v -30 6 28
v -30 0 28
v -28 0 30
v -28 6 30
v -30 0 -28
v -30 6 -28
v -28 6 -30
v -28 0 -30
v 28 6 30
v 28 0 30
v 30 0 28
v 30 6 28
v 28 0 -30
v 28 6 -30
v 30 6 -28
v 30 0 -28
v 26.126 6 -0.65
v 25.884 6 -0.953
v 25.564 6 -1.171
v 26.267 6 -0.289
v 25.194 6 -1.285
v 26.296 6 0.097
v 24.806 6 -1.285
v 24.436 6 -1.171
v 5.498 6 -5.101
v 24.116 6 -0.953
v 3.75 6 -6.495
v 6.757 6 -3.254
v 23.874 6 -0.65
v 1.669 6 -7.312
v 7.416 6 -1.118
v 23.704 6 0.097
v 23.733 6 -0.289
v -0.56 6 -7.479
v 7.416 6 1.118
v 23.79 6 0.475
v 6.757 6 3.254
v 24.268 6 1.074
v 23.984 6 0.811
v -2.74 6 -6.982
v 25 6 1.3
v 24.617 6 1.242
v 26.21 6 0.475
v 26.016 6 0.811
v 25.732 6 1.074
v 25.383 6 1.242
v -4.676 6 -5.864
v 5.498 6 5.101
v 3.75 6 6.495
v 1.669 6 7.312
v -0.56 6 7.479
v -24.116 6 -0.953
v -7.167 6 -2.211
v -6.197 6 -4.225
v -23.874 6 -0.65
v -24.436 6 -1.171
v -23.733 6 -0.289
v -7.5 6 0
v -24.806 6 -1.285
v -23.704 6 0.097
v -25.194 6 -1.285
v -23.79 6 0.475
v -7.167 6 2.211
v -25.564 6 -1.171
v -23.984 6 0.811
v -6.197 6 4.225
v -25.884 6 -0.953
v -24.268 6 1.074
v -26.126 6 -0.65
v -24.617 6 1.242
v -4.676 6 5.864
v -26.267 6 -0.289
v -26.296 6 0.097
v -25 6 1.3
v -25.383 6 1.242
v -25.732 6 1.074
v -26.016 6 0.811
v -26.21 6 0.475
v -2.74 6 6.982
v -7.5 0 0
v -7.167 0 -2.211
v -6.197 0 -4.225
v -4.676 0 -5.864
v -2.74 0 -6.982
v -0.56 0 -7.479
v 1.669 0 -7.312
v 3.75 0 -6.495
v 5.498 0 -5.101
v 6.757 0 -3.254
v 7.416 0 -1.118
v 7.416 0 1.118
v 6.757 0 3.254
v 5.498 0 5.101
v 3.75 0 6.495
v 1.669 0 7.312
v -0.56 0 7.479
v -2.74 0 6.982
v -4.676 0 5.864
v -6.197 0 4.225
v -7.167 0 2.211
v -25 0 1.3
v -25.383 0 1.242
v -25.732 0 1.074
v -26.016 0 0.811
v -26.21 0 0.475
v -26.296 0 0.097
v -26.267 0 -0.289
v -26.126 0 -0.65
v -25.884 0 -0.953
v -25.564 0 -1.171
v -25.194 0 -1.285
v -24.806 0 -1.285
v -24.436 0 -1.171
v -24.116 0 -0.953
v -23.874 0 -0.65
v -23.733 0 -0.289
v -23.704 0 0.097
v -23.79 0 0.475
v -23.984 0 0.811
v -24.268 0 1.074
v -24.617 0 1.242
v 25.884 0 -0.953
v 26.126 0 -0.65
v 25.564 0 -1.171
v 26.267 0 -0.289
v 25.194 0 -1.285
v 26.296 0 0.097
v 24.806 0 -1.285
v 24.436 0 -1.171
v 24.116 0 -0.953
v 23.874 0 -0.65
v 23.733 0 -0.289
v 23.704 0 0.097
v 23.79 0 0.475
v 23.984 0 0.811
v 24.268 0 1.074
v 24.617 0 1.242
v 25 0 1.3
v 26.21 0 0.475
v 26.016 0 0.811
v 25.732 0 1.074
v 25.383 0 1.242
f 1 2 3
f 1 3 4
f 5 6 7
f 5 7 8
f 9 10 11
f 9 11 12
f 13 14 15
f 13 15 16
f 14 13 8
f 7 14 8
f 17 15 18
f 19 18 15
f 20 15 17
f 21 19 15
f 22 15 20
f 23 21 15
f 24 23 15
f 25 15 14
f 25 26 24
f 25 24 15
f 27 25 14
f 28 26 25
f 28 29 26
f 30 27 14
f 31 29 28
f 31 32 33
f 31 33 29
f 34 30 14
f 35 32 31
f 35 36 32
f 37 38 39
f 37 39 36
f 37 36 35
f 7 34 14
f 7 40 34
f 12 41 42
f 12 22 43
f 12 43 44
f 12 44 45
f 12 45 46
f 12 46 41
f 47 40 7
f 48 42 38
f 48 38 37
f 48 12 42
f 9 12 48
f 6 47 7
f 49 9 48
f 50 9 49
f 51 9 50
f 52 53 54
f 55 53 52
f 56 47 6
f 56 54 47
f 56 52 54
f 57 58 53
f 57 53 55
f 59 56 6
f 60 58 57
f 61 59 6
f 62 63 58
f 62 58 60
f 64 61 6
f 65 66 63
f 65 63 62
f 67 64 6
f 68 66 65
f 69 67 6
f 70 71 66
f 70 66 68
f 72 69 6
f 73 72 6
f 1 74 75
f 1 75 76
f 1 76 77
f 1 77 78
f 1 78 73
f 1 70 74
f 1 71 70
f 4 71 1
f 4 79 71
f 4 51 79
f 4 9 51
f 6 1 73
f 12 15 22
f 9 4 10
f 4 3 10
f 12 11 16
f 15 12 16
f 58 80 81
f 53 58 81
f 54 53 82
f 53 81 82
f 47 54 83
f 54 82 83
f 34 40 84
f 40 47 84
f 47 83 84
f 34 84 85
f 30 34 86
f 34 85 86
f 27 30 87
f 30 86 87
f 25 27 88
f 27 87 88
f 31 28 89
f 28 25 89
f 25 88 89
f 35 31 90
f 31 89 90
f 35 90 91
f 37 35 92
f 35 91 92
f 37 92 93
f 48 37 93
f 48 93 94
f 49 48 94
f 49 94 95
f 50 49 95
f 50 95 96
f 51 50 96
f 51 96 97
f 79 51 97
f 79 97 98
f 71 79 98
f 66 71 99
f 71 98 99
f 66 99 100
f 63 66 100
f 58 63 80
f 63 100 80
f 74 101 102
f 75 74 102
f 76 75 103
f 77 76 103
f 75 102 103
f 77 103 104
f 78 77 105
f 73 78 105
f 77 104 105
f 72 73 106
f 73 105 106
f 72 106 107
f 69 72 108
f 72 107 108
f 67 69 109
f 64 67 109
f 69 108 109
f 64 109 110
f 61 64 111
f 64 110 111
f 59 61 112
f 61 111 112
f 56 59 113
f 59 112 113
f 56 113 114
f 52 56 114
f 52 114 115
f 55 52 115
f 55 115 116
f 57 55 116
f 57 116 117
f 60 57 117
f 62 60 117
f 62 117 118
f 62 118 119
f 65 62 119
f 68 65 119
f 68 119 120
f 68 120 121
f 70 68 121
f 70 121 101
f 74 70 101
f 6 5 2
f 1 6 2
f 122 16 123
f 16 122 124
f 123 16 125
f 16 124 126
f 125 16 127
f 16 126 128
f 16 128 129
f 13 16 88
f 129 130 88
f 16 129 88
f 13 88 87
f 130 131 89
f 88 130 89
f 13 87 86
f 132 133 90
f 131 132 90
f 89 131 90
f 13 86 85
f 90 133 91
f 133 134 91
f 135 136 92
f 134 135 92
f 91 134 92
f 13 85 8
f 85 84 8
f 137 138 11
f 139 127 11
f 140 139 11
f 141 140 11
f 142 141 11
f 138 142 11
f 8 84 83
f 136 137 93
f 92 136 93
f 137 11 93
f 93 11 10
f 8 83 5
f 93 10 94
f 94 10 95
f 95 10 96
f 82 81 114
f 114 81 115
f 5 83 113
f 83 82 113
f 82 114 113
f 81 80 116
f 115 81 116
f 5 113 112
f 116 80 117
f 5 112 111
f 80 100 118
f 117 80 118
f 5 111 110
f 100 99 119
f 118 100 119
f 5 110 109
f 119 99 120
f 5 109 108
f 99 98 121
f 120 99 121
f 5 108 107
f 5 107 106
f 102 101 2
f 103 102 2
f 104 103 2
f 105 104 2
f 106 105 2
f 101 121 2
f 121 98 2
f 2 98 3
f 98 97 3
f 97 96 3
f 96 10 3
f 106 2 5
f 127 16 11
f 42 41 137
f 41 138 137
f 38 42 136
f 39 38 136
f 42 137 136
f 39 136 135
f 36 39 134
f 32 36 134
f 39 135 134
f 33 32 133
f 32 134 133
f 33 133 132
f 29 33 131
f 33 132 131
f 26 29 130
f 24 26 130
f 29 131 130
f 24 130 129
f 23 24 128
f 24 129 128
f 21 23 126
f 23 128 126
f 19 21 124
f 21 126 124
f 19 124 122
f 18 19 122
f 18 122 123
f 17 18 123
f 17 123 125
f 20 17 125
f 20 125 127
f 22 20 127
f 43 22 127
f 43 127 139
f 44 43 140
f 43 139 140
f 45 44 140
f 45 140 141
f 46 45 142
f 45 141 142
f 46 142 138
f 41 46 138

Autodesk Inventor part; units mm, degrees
ref_plane "YZ Plane" through (0, 0, 0) normal (1, 0, 0) x (0, 1, 0)
ref_plane "XZ Plane" through (0, 0, 0) normal (0, 1, 0) x (-1, 0, 0)
ref_plane "XY Plane" through (0, 0, 0) normal (0, 0, 1) x (1, 0, 0)
sketch "Sketch1" plane through (0, 0, 0) normal (0, 1, 0) x (-1, 0, 0)
  line L0 (-30, -30) -> (30, -30)
  line L1 (30, -30) -> (30, 30)
  line L2 (30, 30) -> (-30, 30)
  line L3 (-30, 30) -> (-30, -30)
  line L4 (-30, -30) -> (30, 30) construction
  line L5 (30, -30) -> (-30, 30) construction
  circle A0 centre (0, 0) radius 7.5
  dimension "d0" = 60
  dimension "d1" = 60
  dimension "d13" = 15
extrude "Extrusion1" add sketch "Sketch1" along normal blind 6
sketch "Sketch2" plane through (0, 6, 0) normal (0, 1, 0) x (1, 0, 0)
  line L0 (30, 30) -> (-30, 30) projected
  line L1 (-30, 30) -> (-30, -30) projected
  line L2 (-30, -30) -> (30, -30) projected
  line L3 (30, -30) -> (30, 30) projected
  line L4 (25, -25) -> (-25, -25)
  line L5 (-25, -25) -> (-25, 25)
  line L6 (-25, 25) -> (25, 25)
  line L7 (25, 25) -> (25, -25)
  line L8 (25, -25) -> (-25, 25) construction
  line L9 (-25, -25) -> (25, 25) construction
  line L10 (0, -25) -> (0, 25)
  line L11 (-25, 0) -> (25, 0)
  point P0 (0, 0)
  point P1 (0, 25)
  point P2 (-0.9499, 25.1888)
  dimension "d4" = 50
  dimension "d5" = 50
hole "Hole1" at (-25, 6, 0) at (25, 6, 0) direction (0, -1, 0) diameter 2.6 depth 10 tip angle 118
chamfer "Chamfer1" distance 2 angle 45 4 edges at (30, 3, 30) (30, 3, -30) (-30, 3, -30) (-30, 3, 30)
properties part number "00_XY_stage-CHUO_SEIKI_LD-647-R1-Top"
